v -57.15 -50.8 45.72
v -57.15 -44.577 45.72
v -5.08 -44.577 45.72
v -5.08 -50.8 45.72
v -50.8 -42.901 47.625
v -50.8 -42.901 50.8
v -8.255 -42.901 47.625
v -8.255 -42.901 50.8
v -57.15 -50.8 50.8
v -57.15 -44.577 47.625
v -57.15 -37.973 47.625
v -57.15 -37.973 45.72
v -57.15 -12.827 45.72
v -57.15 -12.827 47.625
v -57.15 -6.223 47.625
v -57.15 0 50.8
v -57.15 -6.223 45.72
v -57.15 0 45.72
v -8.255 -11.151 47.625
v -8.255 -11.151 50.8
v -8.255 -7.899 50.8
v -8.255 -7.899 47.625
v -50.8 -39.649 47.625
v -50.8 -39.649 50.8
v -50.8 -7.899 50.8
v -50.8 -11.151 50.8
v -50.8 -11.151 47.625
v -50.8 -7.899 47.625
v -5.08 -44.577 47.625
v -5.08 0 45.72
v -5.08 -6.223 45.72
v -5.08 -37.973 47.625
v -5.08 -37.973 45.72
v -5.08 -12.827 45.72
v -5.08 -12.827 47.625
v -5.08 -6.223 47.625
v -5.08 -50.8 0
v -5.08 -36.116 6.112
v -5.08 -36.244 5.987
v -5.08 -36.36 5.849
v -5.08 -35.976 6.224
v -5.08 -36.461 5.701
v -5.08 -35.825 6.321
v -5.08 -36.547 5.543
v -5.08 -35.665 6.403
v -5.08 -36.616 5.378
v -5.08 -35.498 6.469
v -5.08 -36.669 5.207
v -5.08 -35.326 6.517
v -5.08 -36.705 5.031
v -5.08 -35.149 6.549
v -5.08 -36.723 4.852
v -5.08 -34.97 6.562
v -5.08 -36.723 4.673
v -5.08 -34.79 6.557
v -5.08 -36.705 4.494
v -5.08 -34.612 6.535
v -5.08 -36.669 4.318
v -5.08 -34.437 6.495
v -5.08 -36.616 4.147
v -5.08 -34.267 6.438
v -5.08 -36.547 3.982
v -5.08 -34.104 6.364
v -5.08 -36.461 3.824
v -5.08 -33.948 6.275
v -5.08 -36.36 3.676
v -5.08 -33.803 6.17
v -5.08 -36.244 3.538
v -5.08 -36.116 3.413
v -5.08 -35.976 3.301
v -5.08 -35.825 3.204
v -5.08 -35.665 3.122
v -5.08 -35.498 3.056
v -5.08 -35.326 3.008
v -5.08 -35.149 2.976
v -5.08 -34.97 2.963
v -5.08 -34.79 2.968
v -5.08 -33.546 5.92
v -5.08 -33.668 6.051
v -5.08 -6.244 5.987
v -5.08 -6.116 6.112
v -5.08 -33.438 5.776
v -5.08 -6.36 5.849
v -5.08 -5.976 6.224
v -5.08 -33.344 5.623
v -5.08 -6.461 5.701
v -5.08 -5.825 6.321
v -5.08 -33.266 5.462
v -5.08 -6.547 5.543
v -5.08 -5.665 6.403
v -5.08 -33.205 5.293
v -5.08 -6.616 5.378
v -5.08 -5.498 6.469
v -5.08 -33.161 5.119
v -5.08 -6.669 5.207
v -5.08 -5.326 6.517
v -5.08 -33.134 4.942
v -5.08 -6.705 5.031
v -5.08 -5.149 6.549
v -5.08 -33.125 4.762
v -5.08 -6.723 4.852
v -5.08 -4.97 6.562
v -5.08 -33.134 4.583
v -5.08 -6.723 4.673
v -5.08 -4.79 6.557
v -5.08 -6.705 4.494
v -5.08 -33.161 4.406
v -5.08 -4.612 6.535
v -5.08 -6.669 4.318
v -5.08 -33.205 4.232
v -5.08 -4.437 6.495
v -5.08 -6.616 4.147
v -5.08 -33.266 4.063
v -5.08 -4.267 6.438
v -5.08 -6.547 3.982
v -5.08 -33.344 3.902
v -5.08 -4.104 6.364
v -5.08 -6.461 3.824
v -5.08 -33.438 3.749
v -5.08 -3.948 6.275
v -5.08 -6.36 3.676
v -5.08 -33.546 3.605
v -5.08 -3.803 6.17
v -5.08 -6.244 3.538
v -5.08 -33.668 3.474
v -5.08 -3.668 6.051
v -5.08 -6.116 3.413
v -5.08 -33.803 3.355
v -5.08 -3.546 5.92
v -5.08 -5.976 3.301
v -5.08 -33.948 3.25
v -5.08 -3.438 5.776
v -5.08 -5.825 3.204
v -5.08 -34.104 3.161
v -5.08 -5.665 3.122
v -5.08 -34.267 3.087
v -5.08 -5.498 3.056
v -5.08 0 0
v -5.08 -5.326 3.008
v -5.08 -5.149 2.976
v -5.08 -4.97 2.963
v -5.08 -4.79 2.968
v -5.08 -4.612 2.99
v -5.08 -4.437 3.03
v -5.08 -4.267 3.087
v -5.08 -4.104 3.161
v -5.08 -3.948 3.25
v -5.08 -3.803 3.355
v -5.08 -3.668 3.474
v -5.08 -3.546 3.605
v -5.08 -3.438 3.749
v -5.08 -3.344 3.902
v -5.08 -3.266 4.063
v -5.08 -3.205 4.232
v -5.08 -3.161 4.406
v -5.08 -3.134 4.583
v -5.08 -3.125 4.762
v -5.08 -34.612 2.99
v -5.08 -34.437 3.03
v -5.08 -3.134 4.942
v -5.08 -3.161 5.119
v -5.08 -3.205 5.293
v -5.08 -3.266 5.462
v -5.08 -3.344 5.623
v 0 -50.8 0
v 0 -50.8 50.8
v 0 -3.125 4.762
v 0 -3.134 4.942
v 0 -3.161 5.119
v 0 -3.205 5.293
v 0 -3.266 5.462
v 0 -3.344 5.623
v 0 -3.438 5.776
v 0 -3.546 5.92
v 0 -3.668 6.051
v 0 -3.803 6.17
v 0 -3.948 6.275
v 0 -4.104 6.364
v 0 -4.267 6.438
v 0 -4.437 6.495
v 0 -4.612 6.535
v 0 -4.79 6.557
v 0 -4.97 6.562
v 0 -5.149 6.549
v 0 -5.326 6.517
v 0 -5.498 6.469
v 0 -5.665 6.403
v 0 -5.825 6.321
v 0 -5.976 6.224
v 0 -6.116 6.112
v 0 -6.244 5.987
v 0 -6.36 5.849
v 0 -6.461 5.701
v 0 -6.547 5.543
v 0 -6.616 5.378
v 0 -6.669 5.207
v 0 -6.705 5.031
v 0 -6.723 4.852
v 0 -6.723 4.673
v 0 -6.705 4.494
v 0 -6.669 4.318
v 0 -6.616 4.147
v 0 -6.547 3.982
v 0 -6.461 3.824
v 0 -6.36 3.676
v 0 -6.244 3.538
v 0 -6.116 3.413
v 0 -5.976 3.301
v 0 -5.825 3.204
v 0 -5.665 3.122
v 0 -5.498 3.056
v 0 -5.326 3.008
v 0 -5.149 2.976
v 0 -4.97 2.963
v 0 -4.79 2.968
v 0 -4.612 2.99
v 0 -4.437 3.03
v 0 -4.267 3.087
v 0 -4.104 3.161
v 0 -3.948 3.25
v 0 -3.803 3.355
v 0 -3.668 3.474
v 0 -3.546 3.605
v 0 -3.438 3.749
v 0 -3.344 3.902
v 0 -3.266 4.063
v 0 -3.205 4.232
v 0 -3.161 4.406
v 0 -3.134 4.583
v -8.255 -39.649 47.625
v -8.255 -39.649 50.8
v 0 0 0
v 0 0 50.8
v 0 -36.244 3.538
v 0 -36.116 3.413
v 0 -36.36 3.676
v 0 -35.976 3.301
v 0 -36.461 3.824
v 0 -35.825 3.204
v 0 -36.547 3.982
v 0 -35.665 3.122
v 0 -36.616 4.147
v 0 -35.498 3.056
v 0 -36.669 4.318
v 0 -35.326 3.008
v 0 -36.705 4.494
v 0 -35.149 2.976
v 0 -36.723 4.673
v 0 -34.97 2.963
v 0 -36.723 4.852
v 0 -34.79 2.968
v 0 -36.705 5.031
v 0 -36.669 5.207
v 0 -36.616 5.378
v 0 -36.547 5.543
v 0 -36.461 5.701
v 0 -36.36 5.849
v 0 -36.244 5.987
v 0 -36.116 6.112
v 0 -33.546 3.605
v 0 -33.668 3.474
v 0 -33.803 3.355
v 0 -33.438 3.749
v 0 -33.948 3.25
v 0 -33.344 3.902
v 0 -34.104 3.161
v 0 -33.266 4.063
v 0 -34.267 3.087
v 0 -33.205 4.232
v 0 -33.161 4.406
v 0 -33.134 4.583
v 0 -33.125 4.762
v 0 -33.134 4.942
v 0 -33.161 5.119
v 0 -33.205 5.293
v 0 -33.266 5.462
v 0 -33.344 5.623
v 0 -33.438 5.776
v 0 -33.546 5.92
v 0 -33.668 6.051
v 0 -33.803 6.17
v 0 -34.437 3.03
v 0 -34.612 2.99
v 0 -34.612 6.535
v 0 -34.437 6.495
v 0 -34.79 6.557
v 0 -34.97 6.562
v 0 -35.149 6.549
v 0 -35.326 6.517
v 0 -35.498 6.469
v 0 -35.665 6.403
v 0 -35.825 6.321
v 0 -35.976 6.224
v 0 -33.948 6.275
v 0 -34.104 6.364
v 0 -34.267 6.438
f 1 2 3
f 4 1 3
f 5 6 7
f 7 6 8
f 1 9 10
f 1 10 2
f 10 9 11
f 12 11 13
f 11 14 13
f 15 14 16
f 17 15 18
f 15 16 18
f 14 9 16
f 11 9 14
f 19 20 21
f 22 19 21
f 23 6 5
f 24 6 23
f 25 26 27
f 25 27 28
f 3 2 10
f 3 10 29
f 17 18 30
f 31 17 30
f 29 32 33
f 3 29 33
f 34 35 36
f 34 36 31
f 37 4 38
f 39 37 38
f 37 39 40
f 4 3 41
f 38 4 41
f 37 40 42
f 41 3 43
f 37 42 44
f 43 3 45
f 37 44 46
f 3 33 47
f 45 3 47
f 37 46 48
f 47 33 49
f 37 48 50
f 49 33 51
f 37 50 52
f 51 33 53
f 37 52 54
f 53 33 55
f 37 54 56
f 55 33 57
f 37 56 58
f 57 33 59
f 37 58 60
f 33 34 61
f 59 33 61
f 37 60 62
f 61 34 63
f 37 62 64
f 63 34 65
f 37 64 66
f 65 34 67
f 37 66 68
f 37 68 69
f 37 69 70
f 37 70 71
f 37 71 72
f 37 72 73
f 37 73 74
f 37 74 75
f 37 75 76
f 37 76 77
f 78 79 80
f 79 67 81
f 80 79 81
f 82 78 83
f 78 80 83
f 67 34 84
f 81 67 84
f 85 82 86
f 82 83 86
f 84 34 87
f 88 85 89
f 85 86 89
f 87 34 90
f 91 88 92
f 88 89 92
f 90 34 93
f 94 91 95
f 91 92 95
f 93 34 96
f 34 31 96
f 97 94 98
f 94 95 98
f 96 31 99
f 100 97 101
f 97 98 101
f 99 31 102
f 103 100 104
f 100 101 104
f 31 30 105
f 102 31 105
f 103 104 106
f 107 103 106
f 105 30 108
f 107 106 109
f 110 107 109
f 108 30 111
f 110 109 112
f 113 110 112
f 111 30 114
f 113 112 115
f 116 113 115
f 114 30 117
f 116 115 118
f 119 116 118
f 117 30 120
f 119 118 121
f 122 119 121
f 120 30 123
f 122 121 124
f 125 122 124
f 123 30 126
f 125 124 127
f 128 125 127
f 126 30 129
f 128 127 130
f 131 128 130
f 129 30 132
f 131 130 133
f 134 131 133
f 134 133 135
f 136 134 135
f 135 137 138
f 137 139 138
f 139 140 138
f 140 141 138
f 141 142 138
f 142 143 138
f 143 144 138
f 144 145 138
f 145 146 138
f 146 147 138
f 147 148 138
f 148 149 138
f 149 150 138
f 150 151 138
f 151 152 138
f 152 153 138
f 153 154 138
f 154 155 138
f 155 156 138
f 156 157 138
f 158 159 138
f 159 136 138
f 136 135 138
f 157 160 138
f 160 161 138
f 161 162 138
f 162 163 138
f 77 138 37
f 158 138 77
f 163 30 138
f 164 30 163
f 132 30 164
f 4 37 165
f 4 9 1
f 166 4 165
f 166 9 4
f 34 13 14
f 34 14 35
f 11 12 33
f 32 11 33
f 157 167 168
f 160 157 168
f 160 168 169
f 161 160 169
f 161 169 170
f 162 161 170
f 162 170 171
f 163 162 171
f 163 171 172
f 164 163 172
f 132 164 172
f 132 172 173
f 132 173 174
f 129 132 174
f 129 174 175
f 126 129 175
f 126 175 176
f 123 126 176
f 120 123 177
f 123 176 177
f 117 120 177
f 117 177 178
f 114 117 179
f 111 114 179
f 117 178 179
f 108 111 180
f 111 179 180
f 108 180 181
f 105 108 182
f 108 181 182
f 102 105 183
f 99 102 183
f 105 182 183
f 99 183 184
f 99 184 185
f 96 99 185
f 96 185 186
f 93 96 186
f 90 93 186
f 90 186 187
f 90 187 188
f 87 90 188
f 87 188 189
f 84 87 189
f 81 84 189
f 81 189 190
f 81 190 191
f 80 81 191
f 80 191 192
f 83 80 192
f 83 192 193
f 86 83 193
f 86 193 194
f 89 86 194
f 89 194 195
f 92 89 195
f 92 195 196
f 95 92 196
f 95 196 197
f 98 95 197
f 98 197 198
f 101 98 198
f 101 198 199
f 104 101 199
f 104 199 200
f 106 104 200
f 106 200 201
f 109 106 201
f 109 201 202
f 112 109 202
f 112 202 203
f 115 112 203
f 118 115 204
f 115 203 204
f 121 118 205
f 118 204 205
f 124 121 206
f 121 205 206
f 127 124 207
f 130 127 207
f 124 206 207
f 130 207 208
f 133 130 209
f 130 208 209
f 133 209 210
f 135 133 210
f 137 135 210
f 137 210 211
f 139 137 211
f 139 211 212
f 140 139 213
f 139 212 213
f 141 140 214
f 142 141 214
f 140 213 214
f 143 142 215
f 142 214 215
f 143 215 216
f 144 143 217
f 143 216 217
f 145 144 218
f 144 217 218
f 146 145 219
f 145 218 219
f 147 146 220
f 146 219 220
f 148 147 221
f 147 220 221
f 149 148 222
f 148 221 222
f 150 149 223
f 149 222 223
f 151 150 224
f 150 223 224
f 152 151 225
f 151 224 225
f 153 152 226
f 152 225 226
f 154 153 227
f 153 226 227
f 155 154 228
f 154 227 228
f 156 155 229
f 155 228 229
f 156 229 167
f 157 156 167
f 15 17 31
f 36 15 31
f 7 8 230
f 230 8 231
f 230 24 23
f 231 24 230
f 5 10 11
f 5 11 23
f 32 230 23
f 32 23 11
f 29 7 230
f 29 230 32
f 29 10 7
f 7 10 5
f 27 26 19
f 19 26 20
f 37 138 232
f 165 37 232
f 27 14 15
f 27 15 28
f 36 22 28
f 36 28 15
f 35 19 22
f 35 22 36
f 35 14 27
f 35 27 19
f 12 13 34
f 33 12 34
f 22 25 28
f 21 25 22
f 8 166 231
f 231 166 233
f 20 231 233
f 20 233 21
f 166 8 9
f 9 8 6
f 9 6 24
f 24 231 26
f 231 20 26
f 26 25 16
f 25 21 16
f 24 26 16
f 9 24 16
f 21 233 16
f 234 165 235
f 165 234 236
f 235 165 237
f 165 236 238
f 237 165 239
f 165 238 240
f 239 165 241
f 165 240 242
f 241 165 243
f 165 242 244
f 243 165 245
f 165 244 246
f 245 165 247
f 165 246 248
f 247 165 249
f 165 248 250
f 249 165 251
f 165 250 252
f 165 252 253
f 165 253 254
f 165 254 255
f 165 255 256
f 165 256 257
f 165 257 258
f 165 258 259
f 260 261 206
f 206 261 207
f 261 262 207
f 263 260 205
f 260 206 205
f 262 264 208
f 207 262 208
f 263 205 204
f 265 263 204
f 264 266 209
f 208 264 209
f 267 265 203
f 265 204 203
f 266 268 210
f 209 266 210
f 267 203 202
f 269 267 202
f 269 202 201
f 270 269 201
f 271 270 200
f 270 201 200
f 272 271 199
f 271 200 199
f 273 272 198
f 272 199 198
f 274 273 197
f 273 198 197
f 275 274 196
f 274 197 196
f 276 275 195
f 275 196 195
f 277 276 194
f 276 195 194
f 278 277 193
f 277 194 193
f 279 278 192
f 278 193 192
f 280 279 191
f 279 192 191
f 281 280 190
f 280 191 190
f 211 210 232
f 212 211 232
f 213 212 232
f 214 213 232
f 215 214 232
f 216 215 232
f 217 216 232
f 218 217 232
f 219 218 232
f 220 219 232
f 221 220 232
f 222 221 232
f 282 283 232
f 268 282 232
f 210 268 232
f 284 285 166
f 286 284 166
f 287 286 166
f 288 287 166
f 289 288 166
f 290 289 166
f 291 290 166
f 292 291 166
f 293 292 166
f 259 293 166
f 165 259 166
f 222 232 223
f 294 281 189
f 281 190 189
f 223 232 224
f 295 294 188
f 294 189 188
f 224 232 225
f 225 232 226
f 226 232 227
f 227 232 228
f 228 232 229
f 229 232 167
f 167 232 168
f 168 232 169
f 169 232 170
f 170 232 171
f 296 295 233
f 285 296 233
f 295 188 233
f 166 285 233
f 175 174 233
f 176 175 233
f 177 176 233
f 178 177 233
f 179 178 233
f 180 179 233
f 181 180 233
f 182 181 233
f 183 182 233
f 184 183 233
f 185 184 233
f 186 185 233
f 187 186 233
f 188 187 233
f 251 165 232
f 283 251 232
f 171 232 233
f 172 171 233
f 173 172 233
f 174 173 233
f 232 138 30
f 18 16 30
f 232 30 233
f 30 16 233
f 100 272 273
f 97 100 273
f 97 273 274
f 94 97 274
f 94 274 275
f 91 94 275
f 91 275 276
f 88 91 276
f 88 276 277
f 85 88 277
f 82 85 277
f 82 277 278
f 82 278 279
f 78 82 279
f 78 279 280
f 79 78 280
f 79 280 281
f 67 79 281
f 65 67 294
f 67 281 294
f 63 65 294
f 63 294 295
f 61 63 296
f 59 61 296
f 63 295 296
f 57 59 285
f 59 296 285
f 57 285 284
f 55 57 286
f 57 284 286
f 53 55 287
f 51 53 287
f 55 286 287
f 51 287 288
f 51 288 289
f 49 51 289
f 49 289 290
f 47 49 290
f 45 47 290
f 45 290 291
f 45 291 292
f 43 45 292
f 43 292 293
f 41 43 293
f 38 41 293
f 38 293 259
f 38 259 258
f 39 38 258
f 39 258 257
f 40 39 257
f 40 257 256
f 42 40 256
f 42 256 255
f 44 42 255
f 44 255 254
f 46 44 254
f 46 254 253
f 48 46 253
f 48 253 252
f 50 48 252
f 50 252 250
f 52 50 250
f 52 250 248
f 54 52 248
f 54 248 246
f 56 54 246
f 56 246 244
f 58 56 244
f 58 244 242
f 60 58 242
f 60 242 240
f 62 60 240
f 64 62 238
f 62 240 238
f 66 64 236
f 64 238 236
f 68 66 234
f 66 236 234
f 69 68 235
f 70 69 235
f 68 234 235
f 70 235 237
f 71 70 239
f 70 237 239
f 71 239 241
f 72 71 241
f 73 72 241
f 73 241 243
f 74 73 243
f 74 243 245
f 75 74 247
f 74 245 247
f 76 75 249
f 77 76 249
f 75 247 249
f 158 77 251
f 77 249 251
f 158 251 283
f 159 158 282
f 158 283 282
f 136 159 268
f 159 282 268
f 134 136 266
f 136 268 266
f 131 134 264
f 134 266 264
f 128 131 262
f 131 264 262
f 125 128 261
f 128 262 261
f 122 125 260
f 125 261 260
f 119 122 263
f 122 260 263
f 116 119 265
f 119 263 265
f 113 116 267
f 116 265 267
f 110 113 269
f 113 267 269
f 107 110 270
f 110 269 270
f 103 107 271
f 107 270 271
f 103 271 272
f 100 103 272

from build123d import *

# Parameters (mm, degrees)
F1_DEPTH = 50.8
F2_R     = 1.8
F3_DEPTH = 25.4
F4_W     = 42.545
F4_H     = 3.2512
F5_DEPTH = 25.4
F6_W     = 52.07
F6_H     = 6.604
F7_DEPTH = 1.905


with BuildPart() as f1:
    # F0 (on Front) → F1 (new body)
    with BuildSketch(Plane.XZ):
        Polygon((-5.08, 0), (0, 0), (0, 50.8), (-57.15, 50.8), (-57.15, 45.72), (-5.08, 45.72), align=None)
    extrude(amount=F1_DEPTH)

    # F2 (on face) → F3 (cut)
    with BuildSketch(Plane.YZ):
        with Locations((-34.925, 4.7625)):
            Circle(F2_R)
        with Locations((-4.925, 4.7625)):
            Circle(F2_R)
    extrude(amount=-F3_DEPTH, mode=Mode.SUBTRACT)

    # F4 (on face) → F5 (cut)
    with BuildSketch(Plane.XY.offset(50.8)):
        with Locations((-29.5275, -41.275)):
            Rectangle(F4_W, F4_H)
        with Locations((-29.5275, -9.525)):
            Rectangle(F4_W, F4_H)
    extrude(amount=-F5_DEPTH, mode=Mode.SUBTRACT)

    # F6 (on face) → F7 (cut)
    with BuildSketch(Plane(origin=(0, 0, 45.72), x_dir=(1, 0, 0), z_dir=(0, 0, -1))):
        with Locations((-31.115, 41.275)):
            Rectangle(F6_W, F6_H)
        with Locations((-31.115, 9.525)):
            Rectangle(F6_W, F6_H)
    extrude(amount=-F7_DEPTH, mode=Mode.SUBTRACT)


solid = f1.part
